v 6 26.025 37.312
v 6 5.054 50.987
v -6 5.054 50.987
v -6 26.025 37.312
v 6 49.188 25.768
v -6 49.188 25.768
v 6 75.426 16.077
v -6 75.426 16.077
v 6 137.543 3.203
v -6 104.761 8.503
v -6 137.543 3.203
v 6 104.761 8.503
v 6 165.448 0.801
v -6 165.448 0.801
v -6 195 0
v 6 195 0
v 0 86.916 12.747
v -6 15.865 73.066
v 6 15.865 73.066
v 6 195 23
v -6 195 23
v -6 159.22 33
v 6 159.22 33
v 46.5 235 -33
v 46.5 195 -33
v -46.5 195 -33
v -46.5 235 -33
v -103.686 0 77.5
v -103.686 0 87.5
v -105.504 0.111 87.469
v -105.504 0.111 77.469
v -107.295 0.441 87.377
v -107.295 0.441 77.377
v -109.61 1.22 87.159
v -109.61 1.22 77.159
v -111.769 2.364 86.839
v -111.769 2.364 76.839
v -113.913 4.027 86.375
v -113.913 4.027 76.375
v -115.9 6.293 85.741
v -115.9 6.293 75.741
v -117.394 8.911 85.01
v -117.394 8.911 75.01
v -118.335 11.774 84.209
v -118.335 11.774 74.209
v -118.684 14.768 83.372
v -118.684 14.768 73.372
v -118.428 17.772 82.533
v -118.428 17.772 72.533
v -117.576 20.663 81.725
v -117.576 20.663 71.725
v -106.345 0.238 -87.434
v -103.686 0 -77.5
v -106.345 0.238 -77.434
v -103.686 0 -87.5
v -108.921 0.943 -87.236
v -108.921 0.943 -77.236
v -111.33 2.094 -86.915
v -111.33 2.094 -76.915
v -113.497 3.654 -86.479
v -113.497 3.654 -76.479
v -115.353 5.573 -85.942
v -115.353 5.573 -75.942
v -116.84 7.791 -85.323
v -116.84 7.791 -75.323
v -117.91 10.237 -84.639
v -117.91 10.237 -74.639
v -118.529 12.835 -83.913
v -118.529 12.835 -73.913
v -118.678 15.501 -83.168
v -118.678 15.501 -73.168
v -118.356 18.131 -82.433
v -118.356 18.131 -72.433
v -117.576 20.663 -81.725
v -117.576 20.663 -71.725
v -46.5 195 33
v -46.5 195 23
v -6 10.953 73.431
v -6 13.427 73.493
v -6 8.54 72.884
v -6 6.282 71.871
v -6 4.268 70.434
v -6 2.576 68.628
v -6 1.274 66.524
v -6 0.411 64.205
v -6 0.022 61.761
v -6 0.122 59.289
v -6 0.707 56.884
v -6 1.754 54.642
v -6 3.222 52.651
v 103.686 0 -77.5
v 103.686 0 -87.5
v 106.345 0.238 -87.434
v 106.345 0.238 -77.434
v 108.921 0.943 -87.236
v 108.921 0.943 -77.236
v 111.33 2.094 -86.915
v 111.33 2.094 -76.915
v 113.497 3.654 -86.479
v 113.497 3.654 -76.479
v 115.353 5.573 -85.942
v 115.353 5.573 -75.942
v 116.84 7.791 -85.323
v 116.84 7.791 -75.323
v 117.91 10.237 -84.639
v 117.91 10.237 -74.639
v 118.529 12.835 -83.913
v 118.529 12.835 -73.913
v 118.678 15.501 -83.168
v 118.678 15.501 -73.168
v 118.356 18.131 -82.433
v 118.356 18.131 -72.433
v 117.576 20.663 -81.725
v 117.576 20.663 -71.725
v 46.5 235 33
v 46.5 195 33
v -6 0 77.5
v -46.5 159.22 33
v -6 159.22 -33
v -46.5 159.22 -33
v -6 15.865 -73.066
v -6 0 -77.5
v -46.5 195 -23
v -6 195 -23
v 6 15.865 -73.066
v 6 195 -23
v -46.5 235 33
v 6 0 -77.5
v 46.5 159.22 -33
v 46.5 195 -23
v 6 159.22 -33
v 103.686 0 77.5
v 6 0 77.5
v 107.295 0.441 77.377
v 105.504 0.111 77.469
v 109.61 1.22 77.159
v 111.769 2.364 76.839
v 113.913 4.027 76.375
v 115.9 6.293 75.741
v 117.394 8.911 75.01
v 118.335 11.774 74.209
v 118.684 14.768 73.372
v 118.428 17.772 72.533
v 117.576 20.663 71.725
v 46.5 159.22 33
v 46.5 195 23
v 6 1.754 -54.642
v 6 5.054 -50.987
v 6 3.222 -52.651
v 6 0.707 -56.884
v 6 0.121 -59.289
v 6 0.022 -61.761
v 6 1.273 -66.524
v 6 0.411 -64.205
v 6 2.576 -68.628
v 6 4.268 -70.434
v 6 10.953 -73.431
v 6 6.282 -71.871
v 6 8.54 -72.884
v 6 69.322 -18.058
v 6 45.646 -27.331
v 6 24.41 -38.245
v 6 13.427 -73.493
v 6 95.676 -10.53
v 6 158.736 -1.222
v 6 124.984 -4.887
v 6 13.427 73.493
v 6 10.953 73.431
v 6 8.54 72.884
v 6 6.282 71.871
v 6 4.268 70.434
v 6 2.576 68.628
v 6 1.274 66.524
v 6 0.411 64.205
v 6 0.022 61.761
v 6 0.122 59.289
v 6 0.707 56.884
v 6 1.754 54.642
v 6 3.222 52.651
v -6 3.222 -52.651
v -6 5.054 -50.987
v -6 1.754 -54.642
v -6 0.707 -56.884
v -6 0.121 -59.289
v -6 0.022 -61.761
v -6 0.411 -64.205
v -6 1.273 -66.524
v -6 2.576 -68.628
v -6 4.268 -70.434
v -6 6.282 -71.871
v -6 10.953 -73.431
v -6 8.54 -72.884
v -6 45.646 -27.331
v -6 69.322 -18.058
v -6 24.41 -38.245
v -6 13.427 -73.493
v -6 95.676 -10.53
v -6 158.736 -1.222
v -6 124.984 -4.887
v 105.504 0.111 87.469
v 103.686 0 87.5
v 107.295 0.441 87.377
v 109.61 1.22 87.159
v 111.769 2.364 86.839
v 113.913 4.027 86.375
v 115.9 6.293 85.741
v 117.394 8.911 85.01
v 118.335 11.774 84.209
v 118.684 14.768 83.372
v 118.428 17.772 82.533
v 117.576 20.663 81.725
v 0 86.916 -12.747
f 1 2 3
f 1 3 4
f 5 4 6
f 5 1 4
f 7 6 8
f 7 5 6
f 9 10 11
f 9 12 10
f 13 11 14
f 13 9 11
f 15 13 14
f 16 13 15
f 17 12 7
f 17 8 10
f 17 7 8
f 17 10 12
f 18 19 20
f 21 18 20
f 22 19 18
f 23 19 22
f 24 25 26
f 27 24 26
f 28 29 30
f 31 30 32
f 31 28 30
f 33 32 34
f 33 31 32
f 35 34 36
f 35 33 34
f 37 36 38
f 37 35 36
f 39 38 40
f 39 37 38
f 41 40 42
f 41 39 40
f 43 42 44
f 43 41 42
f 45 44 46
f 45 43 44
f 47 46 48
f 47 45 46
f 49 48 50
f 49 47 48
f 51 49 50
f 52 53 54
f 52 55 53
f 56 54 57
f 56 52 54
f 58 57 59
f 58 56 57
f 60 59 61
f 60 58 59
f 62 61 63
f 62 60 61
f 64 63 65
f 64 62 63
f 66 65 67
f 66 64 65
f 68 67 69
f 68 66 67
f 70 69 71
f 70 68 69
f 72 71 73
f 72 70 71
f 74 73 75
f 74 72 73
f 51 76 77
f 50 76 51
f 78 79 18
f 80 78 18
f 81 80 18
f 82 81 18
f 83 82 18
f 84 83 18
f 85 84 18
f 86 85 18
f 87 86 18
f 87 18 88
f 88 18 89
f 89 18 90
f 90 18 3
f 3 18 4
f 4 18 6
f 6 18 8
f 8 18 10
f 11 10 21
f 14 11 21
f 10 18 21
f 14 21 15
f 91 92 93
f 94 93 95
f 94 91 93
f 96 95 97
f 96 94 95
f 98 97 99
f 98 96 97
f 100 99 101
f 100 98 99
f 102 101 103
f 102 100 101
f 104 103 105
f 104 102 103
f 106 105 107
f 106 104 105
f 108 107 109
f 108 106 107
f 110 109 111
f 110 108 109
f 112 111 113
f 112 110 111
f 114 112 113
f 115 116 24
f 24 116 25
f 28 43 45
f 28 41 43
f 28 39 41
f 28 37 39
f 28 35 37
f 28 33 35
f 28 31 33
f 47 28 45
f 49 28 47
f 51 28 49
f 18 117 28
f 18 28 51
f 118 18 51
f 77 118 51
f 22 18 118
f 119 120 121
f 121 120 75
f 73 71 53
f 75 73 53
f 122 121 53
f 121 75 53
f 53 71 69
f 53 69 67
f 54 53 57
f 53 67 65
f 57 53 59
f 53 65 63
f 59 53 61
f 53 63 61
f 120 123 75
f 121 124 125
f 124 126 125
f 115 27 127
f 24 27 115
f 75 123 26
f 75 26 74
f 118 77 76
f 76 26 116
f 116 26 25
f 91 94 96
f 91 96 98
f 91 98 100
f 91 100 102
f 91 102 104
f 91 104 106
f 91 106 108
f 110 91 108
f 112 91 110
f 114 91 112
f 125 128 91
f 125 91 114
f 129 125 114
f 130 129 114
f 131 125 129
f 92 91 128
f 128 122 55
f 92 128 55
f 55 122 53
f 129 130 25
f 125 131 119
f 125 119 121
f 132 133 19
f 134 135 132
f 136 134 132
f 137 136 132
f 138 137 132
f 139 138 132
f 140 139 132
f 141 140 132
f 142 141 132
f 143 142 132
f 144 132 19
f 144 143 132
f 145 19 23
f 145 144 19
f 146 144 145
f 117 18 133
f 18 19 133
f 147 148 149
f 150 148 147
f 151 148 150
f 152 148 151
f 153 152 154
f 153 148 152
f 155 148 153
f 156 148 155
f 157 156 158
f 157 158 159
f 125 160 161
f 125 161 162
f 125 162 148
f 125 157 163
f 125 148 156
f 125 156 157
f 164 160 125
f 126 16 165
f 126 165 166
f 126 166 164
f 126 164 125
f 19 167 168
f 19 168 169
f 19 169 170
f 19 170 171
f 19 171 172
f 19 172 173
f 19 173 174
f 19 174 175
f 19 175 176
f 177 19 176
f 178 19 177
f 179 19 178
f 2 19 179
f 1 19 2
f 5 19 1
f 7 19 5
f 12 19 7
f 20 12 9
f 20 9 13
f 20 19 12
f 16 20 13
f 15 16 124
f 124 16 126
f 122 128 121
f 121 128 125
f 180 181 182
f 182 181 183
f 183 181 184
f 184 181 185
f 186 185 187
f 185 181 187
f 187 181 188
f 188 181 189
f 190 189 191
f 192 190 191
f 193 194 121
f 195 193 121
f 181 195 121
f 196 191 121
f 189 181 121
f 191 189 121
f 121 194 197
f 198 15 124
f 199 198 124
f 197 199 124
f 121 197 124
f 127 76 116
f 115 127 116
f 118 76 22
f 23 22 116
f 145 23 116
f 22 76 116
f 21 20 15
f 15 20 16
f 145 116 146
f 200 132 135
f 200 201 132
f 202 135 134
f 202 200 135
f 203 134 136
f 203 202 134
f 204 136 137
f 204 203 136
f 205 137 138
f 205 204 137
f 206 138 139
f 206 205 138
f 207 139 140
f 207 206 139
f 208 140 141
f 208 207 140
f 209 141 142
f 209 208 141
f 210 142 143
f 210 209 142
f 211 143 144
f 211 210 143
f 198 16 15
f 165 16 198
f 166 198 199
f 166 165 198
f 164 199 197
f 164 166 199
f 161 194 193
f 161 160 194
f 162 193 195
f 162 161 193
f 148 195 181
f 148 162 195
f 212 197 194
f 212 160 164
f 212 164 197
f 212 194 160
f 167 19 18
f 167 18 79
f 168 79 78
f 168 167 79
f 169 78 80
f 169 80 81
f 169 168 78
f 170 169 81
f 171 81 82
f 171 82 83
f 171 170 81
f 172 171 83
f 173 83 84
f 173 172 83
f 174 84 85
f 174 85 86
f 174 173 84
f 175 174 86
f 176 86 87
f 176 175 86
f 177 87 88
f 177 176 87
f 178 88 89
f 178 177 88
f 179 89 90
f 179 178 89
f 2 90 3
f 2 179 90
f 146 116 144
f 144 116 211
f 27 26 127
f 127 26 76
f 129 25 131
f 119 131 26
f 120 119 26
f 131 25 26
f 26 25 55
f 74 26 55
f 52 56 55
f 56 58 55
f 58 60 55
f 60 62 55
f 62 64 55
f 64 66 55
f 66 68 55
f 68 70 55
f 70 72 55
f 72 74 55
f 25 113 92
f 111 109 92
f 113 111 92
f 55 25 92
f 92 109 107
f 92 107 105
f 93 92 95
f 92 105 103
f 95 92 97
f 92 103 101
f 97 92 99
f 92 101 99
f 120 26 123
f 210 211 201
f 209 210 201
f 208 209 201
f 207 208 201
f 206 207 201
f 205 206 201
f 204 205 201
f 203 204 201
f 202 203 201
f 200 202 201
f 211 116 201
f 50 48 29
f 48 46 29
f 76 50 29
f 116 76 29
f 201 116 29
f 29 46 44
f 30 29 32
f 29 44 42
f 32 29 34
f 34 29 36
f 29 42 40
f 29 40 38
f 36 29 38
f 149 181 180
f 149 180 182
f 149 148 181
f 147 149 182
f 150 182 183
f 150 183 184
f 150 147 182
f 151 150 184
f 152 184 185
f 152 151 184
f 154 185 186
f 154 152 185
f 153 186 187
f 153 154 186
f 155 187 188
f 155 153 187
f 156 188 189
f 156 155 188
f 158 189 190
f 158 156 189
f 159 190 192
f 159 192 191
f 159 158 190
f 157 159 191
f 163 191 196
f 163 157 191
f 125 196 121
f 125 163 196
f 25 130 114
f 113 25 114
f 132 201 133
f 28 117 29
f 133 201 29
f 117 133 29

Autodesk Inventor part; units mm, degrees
ref_plane "YZ Plane" through (0, 0, 0) normal (1, 0, 0) x (0, 1, 0)
ref_plane "XZ Plane" through (0, 0, 0) normal (0, 1, 0) x (-1, 0, 0)
ref_plane "XY Plane" through (0, 0, 0) normal (0, 0, 1) x (1, 0, 0)
sketch "Sketch1" plane through (0, 0, 0) normal (0, 1, 0) x (-1, 0, 0)
  line L0 (126, -87.5) -> (-126, -87.5)
  line L1 (-126, -87.5) -> (-126, 87.5)
  line L2 (-126, 87.5) -> (126, 87.5)
  line L3 (126, 87.5) -> (126, -87.5)
  line L4 (0, -87.5) -> (0, 87.5) construction
  line L5 (126, 0) -> (-126, 0) construction
  point P0 (0, 0)
  point P1 (0, 0)
  dimension "d0" = 252
  dimension "d1" = 175
extrude "Extrusion1" add sketch "Sketch1" along normal blind 235
sketch "Sketch3" plane through (0, 235, 0) normal (0, 1, 0) x (1, 0, 0)
  line L0 (126, 87.5) -> (-126, 87.5) projected
  line L1 (-126, 87.5) -> (-126, -87.5) projected
  line L2 (-126, -87.5) -> (126, -87.5) projected
  line L3 (126, -87.5) -> (126, 87.5) projected
  line L4 (-46.5, 33) -> (46.5, 33)
  line L5 (46.5, 33) -> (46.5, -33)
  line L6 (46.5, -33) -> (-46.5, -33)
  line L7 (-46.5, -33) -> (-46.5, 33)
  line L8 (0, 33) -> (0, -33) construction
  line L9 (-46.5, 0) -> (46.5, 0) construction
  point P0 (0, 0)
  point P1 (0, 0)
  dimension "d6" = 93
  dimension "d7" = 66
extrude "Extrusion2" cut sketch "Sketch3" against normal blind 40
sketch "Sketch4" plane through (-126, 0, 87.5) normal (0, 0, 1) x (1, 0, 0)
  line L0 (79.5, 235) -> (79.5, 195) construction
  line L1 (172.5, 235) -> (172.5, 195) construction
  line L2 (252, 0) -> (0, 0) projected
  line L3 (79.5, 195) -> (0, 0)
  line L4 (172.5, 195) -> (252, 0)
  line L5 (0, 0) -> (0, 195) projected
  line L6 (252, 195) -> (0, 195) projected
  line L7 (252, 0) -> (252, 195) projected
  point P0 (126, 0)
extrude "Extrusion3" cut sketch "Sketch4" against normal up to next contours L4 L6 L7 | L5 L6 L3
sketch "Sketch5" plane through (-46.5, 235, -33) normal (-1, 0, 0) x (0, 0, 1)
  line L0 (66, 0) -> (66, -40) projected
  line L1 (120.5, -235) -> (120.5, -40) projected
  line L2 (66, -40) -> (120.5, -235)
  line L3 (120.5, -235) -> (120.5, -40)
  line L4 (120.5, -40) -> (66, -40) projected
  line L5 (120.5, -40) -> (66, -40)
  line L6 (0, -40) -> (-54.5, -40) projected
  line L7 (0, -40) -> (-54.5, -235)
  line L8 (-54.5, -235) -> (-54.5, -40)
  point P0 (33, -235)
extrude "Extrusion4" cut sketch "Sketch5" along normal up to next
sketch "Sketch6" plane through (-46.5, 235, -33) normal (-1, 0, 0) x (0, 0, 1)
  line L0 (-54.5, -40) -> (0, -40) projected
  line L1 (-54.5, -235) -> (-54.5, -40) projected
  line L2 (-54.5, -235) -> (0, -40) projected
  line L3 (66, -40) -> (120.5, -235) projected
  line L4 (120.5, -40) -> (120.5, -235) projected
  line L5 (66, -40) -> (120.5, -40) projected
  point P0 (33, -235)
extrude "Extrusion5" cut sketch "Sketch6" against normal up to next
sketch "Sketch7" plane through (-46.5, 235, -33) normal (-1, 0, 0) x (0, 0, 1)
  line L0 (66, -40) -> (0, -40) projected
  line L1 (0, -40) -> (10, -40)
  line L2 (0, -40) -> (-54.5, -235) projected
  line L3 (120.5, -235) -> (-54.5, -235) projected
  line L4 (-54.5, -235) -> (-44.5, -235)
  line L5 (-44.5, -235) -> (10, -40)
  line L6 (66, -40) -> (56, -40)
  line L7 (120.5, -235) -> (110.5, -235)
  line L8 (110.5, -235) -> (56, -40)
  line L9 (120.5, -235) -> (66, -40) projected
  point P0 (33, -235)
  dimension "d16" = 10
  dimension "d17" = 10
  dimension "d18" = 10
  dimension "d19" = 10
extrude "Extrusion6" cut sketch "Sketch7" along normal up to next contours L8 L3 L5 L0
sketch "Sketch8" plane through (-46.5, 235, -33) normal (-1, 0, 0) x (0, 0, 1)
  line L0 (110.5, -235) -> (56, -40) projected
  line L1 (10, -40) -> (-44.5, -235) projected
  line L2 (56, -40) -> (10, -40)
  line L3 (110.5, -235) -> (-44.5, -235) projected
  point P0 (33, -235)
extrude "Extrusion7" cut sketch "Sketch8" against normal blind 40.5
sketch "Sketch9" plane through (46.5, 235, 33) normal (1, 0, 0) x (0, 0, -1)
  line L0 (10, -40) -> (-44.5, -235) projected
  line L1 (56, -40) -> (10, -40) projected
  line L2 (110.5, -235) -> (56, -40) projected
  line L3 (-44.5, -235) -> (110.5, -235) projected
  point P0 (33, -235)
extrude "Extrusion8" cut sketch "Sketch9" along normal up to next
sketch "Sketch10" plane through (46.5, 235, 33) normal (1, 0, 0) x (0, 0, -1)
  line L0 (0, -40) -> (10, -40) projected
  line L1 (56, -40) -> (10, -40) projected
  line L2 (10, -40) -> (56, -40)
  line L3 (-44.5, -235) -> (10, -40) projected
  line L4 (110.5, -235) -> (-44.5, -235) projected
  line L5 (56, -40) -> (110.5, -235) projected
  point P0 (33, -235)
extrude "Extrusion9" cut sketch "Sketch10" against normal blind 40.5
sketch "Sketch11" plane through (6, 235, 33) normal (1, 0, 0) x (0, 0, -1)
  line L0 (10, -40) -> (56, -40) construction
  line L1 (33, -40) -> (33, -235) construction
  arc A0 (-40.066, -219.1354) -> (-17.9871, -229.946) centre (-28.0274, -222.5) ccw
  line L2 (110.5, -235) -> (-44.5, -235) construction
  line L3 (-44.5, -235) -> (10, -40) construction
  line L4 (-17.9871, -229.946) -> (33, -161.1943) construction
  line L5 (33, -161.1943) -> (33, -40) construction
  spline S0 degree 2 poles (-17.9871, -229.946) (33, -161.1943) (33, -40) knots 1 1 1 2 2 2
  line L6 (-40.066, -219.1354) -> (-44.5, -235)
  line L7 (-28.0274, -235) -> (33, -235)
  line L8 (33, -235) -> (33, -40)
  line L9 (-28.0274, -235) -> (-44.5, -235)
  arc A1 (83.9871, -229.946) -> (106.066, -219.1354) centre (94.0274, -222.5) ccw
  line L10 (83.9871, -229.946) -> (33, -161.1943) construction
  line L11 (33, -161.1943) -> (33, -40) construction
  spline S1 degree 2 poles (83.9871, -229.946) (33, -161.1943) (33, -40) knots 1 1 1 2 2 2
  line L12 (33, -235) -> (94.0274, -235)
  line L13 (110.5, -235) -> (106.066, -219.1354)
  line L14 (56, -40) -> (110.5, -235) projected
  line L15 (94.0274, -235) -> (110.5, -235)
  dimension "d28" = 25
extrude "Extrusion10" cut sketch "Sketch11" against normal up to next
fillet "Fillet1" radius 15 4 edges at (-126, 0, -82.5) (-126, 0, 82.5) (126, 0, 82.5) (126, 0, -82.5)
sketch "Sketch12" plane through (6, 235, 33) normal (1, 0, 0) x (0, 0, -1)
  arc A0 (-40.066, -219.1354) -> (-17.9871, -229.946) centre (-28.0274, -222.5) ccw projected
  spline S0 degree 2 poles (-17.9871, -229.946) (33, -161.1943) (33, -40) knots 0 0 0 1 1 1 projected
  line L0 (10, -40) -> (33, -40) projected
  line L1 (-40.066, -219.1354) -> (10, -40) projected
  arc A1 (83.9871, -229.946) -> (106.066, -219.1354) centre (94.0274, -222.5) ccw projected
  line L2 (56, -40) -> (106.066, -219.1354) projected
  line L3 (33, -40) -> (56, -40) projected
  spline S1 degree 2 poles (33, -40) (33, -161.1943) (83.9871, -229.946) knots 0 0 0 1 1 1 projected
  point P0 (33, -235)
extrude "Extrusion11" add sketch "Sketch12" against normal blind 12 separate body
sketch "Sketch13" plane through (6, 235, 33) normal (1, 0, 0) x (0, 0, -1)
  arc A0 (-40.066, -219.1354) -> (-17.9871, -229.946) centre (-28.0274, -222.5) ccw projected
  spline S0 degree 2 poles (-17.9871, -229.946) (33, -161.1943) (33, -40) knots 0 0 0 1 1 1 projected
  line L0 (10, -40) -> (33, -40) projected
  line L1 (-40.066, -219.1354) -> (10, -40) projected
  arc A1 (83.9871, -229.946) -> (106.066, -219.1354) centre (94.0274, -222.5) ccw projected
  line L2 (56, -40) -> (106.066, -219.1354) projected
  line L3 (33, -40) -> (56, -40) projected
  spline S1 degree 2 poles (33, -40) (33, -161.1943) (83.9871, -229.946) knots 0 0 0 1 1 1 projected
  point P0 (33, -235)
extrude "Extrusion12" cut sketch "Sketch13" against normal up to next bodies 1
sketch "Sketch14" plane through (0, 235, 0) normal (0, 1, 0) x (1, 0, 0)
  line L0 (-46.5, 33) -> (-46.5, -33) projected
  line L1 (-46.5, -33) -> (46.5, -33) projected
  line L2 (46.5, -33) -> (46.5, 33) projected
  line L3 (46.5, 33) -> (-46.5, 33) projected
  point P0 (0, 0)
extrude "Extrusion13" cut sketch "Sketch14" against normal up to next bodies 1
sketch "Sketch15" plane through (6, 195, 23) normal (0, 1, 0) x (1, 0, 0)
  line L0 (-52.5, -10) -> (40.5, -10) projected
  line L1 (-52.5, -10) -> (40.5, -10)
  line L2 (40.5, -10) -> (40.5, 56)
  line L3 (40.5, 56) -> (-52.5, 56)
  line L4 (-52.5, 56) -> (-52.5, -10)
  point P0 (-6, 23)
extrude "Extrusion14" add sketch "Sketch15" along normal blind 40 separate body
properties part number "ANTENNA"
